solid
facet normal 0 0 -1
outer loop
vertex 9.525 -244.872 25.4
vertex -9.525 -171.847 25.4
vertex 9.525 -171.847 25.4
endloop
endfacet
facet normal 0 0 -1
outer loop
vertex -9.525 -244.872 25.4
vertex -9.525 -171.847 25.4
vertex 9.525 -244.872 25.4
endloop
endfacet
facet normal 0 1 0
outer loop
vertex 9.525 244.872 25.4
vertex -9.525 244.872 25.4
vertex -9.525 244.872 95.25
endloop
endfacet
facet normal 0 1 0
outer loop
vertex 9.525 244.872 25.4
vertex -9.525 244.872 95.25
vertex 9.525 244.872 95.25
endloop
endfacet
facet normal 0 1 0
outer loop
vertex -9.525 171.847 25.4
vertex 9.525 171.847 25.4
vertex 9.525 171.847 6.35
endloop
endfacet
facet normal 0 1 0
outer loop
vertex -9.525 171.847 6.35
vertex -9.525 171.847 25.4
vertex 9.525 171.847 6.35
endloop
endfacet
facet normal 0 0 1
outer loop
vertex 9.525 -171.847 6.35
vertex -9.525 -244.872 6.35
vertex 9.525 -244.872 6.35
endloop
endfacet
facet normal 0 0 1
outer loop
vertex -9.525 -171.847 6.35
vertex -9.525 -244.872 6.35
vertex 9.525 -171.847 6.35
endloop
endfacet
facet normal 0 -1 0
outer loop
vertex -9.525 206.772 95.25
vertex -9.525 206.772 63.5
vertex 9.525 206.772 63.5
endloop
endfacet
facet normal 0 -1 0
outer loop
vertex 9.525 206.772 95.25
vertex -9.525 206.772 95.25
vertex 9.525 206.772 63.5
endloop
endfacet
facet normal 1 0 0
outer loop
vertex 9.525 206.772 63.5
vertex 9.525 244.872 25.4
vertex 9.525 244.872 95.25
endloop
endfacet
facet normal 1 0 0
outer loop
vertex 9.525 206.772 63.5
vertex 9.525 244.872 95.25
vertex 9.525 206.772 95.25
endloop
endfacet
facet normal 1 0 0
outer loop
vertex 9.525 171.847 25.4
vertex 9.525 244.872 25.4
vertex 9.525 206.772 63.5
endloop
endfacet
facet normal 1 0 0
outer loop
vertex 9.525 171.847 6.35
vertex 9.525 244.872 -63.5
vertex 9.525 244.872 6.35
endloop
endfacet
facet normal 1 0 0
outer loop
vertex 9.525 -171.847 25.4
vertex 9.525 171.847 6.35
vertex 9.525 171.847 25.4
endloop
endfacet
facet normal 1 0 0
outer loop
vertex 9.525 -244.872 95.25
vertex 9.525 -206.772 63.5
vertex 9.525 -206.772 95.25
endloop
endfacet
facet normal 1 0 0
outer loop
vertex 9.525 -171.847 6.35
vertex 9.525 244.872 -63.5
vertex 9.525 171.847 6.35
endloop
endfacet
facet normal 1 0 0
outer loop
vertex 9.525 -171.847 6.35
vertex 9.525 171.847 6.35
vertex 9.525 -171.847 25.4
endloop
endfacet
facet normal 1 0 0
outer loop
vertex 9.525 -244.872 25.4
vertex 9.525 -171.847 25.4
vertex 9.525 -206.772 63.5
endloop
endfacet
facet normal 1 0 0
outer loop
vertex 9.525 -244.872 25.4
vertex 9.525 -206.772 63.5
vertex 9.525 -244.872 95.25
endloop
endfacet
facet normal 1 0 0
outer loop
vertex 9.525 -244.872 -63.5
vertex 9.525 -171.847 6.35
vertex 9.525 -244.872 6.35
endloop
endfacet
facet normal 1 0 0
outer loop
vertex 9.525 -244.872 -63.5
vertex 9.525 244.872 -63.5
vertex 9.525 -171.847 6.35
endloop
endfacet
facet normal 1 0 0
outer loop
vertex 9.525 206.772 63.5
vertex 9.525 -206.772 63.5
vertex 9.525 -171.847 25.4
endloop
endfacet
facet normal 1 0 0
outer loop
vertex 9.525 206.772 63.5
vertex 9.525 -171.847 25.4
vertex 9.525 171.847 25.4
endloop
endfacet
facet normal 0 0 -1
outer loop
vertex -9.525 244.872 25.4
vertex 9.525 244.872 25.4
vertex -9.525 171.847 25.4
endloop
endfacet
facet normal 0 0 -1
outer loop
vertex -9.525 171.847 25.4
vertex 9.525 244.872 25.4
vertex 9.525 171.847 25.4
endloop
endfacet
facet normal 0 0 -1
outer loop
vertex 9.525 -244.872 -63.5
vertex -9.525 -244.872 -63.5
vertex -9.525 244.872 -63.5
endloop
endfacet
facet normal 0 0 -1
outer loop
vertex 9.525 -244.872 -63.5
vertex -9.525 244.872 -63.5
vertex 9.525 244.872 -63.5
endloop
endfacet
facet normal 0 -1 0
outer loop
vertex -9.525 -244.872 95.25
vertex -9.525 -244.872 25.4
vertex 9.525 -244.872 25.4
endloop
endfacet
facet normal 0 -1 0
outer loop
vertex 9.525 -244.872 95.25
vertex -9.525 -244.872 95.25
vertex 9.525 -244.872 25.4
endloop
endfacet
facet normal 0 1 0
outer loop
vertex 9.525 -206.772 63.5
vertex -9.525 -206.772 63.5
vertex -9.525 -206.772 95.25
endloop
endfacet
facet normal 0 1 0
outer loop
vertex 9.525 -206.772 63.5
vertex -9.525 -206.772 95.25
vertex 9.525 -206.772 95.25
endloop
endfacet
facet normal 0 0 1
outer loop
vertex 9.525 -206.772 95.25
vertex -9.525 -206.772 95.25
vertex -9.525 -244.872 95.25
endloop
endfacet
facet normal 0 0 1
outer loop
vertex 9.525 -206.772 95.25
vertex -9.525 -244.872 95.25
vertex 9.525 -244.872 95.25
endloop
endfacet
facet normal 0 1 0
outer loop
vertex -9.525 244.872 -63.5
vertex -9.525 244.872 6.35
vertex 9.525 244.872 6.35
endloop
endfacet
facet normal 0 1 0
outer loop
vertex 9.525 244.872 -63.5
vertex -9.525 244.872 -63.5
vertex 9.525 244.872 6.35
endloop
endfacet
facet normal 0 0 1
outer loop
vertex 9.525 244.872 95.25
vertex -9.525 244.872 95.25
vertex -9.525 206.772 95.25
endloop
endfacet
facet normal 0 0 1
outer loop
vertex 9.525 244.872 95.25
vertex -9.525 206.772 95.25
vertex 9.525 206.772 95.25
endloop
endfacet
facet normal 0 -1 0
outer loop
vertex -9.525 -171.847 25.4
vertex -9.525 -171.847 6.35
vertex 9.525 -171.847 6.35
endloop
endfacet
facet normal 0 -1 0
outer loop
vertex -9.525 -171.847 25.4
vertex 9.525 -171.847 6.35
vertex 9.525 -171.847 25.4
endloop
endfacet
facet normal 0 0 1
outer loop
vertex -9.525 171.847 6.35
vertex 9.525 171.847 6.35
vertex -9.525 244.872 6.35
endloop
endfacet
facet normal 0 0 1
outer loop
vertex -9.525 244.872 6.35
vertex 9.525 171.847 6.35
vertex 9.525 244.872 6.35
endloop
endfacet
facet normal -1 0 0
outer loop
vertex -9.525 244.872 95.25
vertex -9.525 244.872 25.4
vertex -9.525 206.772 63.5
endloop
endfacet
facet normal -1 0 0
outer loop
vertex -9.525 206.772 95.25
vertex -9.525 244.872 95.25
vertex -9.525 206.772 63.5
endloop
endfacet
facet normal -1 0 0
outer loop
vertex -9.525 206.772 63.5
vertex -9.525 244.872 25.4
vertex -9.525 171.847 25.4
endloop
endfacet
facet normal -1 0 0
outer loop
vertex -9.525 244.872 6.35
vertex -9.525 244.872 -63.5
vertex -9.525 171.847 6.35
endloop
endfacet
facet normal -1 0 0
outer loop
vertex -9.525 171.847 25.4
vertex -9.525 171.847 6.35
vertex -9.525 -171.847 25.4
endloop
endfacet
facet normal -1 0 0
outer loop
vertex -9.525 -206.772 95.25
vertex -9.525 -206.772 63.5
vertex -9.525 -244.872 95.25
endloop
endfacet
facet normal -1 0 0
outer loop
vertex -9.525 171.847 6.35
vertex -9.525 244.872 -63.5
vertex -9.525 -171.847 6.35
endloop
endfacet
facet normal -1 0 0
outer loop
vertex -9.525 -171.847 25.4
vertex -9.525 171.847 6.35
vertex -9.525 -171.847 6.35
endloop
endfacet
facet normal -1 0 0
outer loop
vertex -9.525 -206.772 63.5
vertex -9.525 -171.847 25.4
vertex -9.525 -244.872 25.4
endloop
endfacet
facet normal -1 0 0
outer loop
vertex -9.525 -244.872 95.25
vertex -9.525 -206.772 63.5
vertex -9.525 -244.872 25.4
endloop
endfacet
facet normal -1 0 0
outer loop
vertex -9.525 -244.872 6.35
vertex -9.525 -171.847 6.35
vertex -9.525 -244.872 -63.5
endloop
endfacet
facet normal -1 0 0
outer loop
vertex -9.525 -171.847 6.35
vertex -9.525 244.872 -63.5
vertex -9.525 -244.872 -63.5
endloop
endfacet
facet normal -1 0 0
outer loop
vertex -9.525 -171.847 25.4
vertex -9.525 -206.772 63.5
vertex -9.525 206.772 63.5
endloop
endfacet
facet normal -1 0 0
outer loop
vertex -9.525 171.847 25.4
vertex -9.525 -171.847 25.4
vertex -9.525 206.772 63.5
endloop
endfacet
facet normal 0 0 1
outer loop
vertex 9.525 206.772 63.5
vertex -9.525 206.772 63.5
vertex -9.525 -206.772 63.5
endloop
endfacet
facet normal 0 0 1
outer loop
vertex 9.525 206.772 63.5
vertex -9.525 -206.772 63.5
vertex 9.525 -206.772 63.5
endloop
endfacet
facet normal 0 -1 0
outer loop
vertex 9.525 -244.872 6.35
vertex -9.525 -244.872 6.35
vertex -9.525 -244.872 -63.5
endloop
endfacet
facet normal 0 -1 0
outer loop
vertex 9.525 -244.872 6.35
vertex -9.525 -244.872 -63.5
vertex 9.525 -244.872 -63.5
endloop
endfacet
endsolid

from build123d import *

# Parameters (mm, degrees)
F0_W     = 19.05
F0_H     = 127
F1_DEPTH = 244.871875
F2_W     = 19.05
F2_H     = 38.1
F3_DEPTH = 31.75
F6_DEPTH = 12.7


with BuildPart() as f1:
    # F0 (on Front) → F1 (new body, symmetric)
    with BuildSketch(Plane.XZ):
        Rectangle(F0_W, F0_H)
    extrude(amount=F1_DEPTH, both=True)

    # F2 (on face) → F3 (join)
    with BuildSketch(Plane.XY.offset(63.5)):
        with Locations((0, 225.821875)):
            Rectangle(F2_W, F2_H)
    extrude(amount=F3_DEPTH)

    # F4: F1 across plane


with BuildPart() as f1_1:
    add(f1.part)
    add(f1.part.mirror(Plane.XZ))

    # F5 (on Right) → F6 (cut, symmetric)
    with BuildSketch(Plane.YZ):
        Polygon((-244.871875, 6.35), (-216.296875, 6.35), (-171.846875, 6.35), (-171.846875, 25.4), (-216.296875, 25.4), (-244.871875, 25.4), align=None)
        Polygon((216.296875, 25.4), (171.846875, 25.4), (171.846875, 6.35), (216.296875, 6.35), (244.871875, 6.35), (244.871875, 25.4), align=None)
    extrude(amount=F6_DEPTH, both=True, mode=Mode.SUBTRACT)


solid = f1_1.part
